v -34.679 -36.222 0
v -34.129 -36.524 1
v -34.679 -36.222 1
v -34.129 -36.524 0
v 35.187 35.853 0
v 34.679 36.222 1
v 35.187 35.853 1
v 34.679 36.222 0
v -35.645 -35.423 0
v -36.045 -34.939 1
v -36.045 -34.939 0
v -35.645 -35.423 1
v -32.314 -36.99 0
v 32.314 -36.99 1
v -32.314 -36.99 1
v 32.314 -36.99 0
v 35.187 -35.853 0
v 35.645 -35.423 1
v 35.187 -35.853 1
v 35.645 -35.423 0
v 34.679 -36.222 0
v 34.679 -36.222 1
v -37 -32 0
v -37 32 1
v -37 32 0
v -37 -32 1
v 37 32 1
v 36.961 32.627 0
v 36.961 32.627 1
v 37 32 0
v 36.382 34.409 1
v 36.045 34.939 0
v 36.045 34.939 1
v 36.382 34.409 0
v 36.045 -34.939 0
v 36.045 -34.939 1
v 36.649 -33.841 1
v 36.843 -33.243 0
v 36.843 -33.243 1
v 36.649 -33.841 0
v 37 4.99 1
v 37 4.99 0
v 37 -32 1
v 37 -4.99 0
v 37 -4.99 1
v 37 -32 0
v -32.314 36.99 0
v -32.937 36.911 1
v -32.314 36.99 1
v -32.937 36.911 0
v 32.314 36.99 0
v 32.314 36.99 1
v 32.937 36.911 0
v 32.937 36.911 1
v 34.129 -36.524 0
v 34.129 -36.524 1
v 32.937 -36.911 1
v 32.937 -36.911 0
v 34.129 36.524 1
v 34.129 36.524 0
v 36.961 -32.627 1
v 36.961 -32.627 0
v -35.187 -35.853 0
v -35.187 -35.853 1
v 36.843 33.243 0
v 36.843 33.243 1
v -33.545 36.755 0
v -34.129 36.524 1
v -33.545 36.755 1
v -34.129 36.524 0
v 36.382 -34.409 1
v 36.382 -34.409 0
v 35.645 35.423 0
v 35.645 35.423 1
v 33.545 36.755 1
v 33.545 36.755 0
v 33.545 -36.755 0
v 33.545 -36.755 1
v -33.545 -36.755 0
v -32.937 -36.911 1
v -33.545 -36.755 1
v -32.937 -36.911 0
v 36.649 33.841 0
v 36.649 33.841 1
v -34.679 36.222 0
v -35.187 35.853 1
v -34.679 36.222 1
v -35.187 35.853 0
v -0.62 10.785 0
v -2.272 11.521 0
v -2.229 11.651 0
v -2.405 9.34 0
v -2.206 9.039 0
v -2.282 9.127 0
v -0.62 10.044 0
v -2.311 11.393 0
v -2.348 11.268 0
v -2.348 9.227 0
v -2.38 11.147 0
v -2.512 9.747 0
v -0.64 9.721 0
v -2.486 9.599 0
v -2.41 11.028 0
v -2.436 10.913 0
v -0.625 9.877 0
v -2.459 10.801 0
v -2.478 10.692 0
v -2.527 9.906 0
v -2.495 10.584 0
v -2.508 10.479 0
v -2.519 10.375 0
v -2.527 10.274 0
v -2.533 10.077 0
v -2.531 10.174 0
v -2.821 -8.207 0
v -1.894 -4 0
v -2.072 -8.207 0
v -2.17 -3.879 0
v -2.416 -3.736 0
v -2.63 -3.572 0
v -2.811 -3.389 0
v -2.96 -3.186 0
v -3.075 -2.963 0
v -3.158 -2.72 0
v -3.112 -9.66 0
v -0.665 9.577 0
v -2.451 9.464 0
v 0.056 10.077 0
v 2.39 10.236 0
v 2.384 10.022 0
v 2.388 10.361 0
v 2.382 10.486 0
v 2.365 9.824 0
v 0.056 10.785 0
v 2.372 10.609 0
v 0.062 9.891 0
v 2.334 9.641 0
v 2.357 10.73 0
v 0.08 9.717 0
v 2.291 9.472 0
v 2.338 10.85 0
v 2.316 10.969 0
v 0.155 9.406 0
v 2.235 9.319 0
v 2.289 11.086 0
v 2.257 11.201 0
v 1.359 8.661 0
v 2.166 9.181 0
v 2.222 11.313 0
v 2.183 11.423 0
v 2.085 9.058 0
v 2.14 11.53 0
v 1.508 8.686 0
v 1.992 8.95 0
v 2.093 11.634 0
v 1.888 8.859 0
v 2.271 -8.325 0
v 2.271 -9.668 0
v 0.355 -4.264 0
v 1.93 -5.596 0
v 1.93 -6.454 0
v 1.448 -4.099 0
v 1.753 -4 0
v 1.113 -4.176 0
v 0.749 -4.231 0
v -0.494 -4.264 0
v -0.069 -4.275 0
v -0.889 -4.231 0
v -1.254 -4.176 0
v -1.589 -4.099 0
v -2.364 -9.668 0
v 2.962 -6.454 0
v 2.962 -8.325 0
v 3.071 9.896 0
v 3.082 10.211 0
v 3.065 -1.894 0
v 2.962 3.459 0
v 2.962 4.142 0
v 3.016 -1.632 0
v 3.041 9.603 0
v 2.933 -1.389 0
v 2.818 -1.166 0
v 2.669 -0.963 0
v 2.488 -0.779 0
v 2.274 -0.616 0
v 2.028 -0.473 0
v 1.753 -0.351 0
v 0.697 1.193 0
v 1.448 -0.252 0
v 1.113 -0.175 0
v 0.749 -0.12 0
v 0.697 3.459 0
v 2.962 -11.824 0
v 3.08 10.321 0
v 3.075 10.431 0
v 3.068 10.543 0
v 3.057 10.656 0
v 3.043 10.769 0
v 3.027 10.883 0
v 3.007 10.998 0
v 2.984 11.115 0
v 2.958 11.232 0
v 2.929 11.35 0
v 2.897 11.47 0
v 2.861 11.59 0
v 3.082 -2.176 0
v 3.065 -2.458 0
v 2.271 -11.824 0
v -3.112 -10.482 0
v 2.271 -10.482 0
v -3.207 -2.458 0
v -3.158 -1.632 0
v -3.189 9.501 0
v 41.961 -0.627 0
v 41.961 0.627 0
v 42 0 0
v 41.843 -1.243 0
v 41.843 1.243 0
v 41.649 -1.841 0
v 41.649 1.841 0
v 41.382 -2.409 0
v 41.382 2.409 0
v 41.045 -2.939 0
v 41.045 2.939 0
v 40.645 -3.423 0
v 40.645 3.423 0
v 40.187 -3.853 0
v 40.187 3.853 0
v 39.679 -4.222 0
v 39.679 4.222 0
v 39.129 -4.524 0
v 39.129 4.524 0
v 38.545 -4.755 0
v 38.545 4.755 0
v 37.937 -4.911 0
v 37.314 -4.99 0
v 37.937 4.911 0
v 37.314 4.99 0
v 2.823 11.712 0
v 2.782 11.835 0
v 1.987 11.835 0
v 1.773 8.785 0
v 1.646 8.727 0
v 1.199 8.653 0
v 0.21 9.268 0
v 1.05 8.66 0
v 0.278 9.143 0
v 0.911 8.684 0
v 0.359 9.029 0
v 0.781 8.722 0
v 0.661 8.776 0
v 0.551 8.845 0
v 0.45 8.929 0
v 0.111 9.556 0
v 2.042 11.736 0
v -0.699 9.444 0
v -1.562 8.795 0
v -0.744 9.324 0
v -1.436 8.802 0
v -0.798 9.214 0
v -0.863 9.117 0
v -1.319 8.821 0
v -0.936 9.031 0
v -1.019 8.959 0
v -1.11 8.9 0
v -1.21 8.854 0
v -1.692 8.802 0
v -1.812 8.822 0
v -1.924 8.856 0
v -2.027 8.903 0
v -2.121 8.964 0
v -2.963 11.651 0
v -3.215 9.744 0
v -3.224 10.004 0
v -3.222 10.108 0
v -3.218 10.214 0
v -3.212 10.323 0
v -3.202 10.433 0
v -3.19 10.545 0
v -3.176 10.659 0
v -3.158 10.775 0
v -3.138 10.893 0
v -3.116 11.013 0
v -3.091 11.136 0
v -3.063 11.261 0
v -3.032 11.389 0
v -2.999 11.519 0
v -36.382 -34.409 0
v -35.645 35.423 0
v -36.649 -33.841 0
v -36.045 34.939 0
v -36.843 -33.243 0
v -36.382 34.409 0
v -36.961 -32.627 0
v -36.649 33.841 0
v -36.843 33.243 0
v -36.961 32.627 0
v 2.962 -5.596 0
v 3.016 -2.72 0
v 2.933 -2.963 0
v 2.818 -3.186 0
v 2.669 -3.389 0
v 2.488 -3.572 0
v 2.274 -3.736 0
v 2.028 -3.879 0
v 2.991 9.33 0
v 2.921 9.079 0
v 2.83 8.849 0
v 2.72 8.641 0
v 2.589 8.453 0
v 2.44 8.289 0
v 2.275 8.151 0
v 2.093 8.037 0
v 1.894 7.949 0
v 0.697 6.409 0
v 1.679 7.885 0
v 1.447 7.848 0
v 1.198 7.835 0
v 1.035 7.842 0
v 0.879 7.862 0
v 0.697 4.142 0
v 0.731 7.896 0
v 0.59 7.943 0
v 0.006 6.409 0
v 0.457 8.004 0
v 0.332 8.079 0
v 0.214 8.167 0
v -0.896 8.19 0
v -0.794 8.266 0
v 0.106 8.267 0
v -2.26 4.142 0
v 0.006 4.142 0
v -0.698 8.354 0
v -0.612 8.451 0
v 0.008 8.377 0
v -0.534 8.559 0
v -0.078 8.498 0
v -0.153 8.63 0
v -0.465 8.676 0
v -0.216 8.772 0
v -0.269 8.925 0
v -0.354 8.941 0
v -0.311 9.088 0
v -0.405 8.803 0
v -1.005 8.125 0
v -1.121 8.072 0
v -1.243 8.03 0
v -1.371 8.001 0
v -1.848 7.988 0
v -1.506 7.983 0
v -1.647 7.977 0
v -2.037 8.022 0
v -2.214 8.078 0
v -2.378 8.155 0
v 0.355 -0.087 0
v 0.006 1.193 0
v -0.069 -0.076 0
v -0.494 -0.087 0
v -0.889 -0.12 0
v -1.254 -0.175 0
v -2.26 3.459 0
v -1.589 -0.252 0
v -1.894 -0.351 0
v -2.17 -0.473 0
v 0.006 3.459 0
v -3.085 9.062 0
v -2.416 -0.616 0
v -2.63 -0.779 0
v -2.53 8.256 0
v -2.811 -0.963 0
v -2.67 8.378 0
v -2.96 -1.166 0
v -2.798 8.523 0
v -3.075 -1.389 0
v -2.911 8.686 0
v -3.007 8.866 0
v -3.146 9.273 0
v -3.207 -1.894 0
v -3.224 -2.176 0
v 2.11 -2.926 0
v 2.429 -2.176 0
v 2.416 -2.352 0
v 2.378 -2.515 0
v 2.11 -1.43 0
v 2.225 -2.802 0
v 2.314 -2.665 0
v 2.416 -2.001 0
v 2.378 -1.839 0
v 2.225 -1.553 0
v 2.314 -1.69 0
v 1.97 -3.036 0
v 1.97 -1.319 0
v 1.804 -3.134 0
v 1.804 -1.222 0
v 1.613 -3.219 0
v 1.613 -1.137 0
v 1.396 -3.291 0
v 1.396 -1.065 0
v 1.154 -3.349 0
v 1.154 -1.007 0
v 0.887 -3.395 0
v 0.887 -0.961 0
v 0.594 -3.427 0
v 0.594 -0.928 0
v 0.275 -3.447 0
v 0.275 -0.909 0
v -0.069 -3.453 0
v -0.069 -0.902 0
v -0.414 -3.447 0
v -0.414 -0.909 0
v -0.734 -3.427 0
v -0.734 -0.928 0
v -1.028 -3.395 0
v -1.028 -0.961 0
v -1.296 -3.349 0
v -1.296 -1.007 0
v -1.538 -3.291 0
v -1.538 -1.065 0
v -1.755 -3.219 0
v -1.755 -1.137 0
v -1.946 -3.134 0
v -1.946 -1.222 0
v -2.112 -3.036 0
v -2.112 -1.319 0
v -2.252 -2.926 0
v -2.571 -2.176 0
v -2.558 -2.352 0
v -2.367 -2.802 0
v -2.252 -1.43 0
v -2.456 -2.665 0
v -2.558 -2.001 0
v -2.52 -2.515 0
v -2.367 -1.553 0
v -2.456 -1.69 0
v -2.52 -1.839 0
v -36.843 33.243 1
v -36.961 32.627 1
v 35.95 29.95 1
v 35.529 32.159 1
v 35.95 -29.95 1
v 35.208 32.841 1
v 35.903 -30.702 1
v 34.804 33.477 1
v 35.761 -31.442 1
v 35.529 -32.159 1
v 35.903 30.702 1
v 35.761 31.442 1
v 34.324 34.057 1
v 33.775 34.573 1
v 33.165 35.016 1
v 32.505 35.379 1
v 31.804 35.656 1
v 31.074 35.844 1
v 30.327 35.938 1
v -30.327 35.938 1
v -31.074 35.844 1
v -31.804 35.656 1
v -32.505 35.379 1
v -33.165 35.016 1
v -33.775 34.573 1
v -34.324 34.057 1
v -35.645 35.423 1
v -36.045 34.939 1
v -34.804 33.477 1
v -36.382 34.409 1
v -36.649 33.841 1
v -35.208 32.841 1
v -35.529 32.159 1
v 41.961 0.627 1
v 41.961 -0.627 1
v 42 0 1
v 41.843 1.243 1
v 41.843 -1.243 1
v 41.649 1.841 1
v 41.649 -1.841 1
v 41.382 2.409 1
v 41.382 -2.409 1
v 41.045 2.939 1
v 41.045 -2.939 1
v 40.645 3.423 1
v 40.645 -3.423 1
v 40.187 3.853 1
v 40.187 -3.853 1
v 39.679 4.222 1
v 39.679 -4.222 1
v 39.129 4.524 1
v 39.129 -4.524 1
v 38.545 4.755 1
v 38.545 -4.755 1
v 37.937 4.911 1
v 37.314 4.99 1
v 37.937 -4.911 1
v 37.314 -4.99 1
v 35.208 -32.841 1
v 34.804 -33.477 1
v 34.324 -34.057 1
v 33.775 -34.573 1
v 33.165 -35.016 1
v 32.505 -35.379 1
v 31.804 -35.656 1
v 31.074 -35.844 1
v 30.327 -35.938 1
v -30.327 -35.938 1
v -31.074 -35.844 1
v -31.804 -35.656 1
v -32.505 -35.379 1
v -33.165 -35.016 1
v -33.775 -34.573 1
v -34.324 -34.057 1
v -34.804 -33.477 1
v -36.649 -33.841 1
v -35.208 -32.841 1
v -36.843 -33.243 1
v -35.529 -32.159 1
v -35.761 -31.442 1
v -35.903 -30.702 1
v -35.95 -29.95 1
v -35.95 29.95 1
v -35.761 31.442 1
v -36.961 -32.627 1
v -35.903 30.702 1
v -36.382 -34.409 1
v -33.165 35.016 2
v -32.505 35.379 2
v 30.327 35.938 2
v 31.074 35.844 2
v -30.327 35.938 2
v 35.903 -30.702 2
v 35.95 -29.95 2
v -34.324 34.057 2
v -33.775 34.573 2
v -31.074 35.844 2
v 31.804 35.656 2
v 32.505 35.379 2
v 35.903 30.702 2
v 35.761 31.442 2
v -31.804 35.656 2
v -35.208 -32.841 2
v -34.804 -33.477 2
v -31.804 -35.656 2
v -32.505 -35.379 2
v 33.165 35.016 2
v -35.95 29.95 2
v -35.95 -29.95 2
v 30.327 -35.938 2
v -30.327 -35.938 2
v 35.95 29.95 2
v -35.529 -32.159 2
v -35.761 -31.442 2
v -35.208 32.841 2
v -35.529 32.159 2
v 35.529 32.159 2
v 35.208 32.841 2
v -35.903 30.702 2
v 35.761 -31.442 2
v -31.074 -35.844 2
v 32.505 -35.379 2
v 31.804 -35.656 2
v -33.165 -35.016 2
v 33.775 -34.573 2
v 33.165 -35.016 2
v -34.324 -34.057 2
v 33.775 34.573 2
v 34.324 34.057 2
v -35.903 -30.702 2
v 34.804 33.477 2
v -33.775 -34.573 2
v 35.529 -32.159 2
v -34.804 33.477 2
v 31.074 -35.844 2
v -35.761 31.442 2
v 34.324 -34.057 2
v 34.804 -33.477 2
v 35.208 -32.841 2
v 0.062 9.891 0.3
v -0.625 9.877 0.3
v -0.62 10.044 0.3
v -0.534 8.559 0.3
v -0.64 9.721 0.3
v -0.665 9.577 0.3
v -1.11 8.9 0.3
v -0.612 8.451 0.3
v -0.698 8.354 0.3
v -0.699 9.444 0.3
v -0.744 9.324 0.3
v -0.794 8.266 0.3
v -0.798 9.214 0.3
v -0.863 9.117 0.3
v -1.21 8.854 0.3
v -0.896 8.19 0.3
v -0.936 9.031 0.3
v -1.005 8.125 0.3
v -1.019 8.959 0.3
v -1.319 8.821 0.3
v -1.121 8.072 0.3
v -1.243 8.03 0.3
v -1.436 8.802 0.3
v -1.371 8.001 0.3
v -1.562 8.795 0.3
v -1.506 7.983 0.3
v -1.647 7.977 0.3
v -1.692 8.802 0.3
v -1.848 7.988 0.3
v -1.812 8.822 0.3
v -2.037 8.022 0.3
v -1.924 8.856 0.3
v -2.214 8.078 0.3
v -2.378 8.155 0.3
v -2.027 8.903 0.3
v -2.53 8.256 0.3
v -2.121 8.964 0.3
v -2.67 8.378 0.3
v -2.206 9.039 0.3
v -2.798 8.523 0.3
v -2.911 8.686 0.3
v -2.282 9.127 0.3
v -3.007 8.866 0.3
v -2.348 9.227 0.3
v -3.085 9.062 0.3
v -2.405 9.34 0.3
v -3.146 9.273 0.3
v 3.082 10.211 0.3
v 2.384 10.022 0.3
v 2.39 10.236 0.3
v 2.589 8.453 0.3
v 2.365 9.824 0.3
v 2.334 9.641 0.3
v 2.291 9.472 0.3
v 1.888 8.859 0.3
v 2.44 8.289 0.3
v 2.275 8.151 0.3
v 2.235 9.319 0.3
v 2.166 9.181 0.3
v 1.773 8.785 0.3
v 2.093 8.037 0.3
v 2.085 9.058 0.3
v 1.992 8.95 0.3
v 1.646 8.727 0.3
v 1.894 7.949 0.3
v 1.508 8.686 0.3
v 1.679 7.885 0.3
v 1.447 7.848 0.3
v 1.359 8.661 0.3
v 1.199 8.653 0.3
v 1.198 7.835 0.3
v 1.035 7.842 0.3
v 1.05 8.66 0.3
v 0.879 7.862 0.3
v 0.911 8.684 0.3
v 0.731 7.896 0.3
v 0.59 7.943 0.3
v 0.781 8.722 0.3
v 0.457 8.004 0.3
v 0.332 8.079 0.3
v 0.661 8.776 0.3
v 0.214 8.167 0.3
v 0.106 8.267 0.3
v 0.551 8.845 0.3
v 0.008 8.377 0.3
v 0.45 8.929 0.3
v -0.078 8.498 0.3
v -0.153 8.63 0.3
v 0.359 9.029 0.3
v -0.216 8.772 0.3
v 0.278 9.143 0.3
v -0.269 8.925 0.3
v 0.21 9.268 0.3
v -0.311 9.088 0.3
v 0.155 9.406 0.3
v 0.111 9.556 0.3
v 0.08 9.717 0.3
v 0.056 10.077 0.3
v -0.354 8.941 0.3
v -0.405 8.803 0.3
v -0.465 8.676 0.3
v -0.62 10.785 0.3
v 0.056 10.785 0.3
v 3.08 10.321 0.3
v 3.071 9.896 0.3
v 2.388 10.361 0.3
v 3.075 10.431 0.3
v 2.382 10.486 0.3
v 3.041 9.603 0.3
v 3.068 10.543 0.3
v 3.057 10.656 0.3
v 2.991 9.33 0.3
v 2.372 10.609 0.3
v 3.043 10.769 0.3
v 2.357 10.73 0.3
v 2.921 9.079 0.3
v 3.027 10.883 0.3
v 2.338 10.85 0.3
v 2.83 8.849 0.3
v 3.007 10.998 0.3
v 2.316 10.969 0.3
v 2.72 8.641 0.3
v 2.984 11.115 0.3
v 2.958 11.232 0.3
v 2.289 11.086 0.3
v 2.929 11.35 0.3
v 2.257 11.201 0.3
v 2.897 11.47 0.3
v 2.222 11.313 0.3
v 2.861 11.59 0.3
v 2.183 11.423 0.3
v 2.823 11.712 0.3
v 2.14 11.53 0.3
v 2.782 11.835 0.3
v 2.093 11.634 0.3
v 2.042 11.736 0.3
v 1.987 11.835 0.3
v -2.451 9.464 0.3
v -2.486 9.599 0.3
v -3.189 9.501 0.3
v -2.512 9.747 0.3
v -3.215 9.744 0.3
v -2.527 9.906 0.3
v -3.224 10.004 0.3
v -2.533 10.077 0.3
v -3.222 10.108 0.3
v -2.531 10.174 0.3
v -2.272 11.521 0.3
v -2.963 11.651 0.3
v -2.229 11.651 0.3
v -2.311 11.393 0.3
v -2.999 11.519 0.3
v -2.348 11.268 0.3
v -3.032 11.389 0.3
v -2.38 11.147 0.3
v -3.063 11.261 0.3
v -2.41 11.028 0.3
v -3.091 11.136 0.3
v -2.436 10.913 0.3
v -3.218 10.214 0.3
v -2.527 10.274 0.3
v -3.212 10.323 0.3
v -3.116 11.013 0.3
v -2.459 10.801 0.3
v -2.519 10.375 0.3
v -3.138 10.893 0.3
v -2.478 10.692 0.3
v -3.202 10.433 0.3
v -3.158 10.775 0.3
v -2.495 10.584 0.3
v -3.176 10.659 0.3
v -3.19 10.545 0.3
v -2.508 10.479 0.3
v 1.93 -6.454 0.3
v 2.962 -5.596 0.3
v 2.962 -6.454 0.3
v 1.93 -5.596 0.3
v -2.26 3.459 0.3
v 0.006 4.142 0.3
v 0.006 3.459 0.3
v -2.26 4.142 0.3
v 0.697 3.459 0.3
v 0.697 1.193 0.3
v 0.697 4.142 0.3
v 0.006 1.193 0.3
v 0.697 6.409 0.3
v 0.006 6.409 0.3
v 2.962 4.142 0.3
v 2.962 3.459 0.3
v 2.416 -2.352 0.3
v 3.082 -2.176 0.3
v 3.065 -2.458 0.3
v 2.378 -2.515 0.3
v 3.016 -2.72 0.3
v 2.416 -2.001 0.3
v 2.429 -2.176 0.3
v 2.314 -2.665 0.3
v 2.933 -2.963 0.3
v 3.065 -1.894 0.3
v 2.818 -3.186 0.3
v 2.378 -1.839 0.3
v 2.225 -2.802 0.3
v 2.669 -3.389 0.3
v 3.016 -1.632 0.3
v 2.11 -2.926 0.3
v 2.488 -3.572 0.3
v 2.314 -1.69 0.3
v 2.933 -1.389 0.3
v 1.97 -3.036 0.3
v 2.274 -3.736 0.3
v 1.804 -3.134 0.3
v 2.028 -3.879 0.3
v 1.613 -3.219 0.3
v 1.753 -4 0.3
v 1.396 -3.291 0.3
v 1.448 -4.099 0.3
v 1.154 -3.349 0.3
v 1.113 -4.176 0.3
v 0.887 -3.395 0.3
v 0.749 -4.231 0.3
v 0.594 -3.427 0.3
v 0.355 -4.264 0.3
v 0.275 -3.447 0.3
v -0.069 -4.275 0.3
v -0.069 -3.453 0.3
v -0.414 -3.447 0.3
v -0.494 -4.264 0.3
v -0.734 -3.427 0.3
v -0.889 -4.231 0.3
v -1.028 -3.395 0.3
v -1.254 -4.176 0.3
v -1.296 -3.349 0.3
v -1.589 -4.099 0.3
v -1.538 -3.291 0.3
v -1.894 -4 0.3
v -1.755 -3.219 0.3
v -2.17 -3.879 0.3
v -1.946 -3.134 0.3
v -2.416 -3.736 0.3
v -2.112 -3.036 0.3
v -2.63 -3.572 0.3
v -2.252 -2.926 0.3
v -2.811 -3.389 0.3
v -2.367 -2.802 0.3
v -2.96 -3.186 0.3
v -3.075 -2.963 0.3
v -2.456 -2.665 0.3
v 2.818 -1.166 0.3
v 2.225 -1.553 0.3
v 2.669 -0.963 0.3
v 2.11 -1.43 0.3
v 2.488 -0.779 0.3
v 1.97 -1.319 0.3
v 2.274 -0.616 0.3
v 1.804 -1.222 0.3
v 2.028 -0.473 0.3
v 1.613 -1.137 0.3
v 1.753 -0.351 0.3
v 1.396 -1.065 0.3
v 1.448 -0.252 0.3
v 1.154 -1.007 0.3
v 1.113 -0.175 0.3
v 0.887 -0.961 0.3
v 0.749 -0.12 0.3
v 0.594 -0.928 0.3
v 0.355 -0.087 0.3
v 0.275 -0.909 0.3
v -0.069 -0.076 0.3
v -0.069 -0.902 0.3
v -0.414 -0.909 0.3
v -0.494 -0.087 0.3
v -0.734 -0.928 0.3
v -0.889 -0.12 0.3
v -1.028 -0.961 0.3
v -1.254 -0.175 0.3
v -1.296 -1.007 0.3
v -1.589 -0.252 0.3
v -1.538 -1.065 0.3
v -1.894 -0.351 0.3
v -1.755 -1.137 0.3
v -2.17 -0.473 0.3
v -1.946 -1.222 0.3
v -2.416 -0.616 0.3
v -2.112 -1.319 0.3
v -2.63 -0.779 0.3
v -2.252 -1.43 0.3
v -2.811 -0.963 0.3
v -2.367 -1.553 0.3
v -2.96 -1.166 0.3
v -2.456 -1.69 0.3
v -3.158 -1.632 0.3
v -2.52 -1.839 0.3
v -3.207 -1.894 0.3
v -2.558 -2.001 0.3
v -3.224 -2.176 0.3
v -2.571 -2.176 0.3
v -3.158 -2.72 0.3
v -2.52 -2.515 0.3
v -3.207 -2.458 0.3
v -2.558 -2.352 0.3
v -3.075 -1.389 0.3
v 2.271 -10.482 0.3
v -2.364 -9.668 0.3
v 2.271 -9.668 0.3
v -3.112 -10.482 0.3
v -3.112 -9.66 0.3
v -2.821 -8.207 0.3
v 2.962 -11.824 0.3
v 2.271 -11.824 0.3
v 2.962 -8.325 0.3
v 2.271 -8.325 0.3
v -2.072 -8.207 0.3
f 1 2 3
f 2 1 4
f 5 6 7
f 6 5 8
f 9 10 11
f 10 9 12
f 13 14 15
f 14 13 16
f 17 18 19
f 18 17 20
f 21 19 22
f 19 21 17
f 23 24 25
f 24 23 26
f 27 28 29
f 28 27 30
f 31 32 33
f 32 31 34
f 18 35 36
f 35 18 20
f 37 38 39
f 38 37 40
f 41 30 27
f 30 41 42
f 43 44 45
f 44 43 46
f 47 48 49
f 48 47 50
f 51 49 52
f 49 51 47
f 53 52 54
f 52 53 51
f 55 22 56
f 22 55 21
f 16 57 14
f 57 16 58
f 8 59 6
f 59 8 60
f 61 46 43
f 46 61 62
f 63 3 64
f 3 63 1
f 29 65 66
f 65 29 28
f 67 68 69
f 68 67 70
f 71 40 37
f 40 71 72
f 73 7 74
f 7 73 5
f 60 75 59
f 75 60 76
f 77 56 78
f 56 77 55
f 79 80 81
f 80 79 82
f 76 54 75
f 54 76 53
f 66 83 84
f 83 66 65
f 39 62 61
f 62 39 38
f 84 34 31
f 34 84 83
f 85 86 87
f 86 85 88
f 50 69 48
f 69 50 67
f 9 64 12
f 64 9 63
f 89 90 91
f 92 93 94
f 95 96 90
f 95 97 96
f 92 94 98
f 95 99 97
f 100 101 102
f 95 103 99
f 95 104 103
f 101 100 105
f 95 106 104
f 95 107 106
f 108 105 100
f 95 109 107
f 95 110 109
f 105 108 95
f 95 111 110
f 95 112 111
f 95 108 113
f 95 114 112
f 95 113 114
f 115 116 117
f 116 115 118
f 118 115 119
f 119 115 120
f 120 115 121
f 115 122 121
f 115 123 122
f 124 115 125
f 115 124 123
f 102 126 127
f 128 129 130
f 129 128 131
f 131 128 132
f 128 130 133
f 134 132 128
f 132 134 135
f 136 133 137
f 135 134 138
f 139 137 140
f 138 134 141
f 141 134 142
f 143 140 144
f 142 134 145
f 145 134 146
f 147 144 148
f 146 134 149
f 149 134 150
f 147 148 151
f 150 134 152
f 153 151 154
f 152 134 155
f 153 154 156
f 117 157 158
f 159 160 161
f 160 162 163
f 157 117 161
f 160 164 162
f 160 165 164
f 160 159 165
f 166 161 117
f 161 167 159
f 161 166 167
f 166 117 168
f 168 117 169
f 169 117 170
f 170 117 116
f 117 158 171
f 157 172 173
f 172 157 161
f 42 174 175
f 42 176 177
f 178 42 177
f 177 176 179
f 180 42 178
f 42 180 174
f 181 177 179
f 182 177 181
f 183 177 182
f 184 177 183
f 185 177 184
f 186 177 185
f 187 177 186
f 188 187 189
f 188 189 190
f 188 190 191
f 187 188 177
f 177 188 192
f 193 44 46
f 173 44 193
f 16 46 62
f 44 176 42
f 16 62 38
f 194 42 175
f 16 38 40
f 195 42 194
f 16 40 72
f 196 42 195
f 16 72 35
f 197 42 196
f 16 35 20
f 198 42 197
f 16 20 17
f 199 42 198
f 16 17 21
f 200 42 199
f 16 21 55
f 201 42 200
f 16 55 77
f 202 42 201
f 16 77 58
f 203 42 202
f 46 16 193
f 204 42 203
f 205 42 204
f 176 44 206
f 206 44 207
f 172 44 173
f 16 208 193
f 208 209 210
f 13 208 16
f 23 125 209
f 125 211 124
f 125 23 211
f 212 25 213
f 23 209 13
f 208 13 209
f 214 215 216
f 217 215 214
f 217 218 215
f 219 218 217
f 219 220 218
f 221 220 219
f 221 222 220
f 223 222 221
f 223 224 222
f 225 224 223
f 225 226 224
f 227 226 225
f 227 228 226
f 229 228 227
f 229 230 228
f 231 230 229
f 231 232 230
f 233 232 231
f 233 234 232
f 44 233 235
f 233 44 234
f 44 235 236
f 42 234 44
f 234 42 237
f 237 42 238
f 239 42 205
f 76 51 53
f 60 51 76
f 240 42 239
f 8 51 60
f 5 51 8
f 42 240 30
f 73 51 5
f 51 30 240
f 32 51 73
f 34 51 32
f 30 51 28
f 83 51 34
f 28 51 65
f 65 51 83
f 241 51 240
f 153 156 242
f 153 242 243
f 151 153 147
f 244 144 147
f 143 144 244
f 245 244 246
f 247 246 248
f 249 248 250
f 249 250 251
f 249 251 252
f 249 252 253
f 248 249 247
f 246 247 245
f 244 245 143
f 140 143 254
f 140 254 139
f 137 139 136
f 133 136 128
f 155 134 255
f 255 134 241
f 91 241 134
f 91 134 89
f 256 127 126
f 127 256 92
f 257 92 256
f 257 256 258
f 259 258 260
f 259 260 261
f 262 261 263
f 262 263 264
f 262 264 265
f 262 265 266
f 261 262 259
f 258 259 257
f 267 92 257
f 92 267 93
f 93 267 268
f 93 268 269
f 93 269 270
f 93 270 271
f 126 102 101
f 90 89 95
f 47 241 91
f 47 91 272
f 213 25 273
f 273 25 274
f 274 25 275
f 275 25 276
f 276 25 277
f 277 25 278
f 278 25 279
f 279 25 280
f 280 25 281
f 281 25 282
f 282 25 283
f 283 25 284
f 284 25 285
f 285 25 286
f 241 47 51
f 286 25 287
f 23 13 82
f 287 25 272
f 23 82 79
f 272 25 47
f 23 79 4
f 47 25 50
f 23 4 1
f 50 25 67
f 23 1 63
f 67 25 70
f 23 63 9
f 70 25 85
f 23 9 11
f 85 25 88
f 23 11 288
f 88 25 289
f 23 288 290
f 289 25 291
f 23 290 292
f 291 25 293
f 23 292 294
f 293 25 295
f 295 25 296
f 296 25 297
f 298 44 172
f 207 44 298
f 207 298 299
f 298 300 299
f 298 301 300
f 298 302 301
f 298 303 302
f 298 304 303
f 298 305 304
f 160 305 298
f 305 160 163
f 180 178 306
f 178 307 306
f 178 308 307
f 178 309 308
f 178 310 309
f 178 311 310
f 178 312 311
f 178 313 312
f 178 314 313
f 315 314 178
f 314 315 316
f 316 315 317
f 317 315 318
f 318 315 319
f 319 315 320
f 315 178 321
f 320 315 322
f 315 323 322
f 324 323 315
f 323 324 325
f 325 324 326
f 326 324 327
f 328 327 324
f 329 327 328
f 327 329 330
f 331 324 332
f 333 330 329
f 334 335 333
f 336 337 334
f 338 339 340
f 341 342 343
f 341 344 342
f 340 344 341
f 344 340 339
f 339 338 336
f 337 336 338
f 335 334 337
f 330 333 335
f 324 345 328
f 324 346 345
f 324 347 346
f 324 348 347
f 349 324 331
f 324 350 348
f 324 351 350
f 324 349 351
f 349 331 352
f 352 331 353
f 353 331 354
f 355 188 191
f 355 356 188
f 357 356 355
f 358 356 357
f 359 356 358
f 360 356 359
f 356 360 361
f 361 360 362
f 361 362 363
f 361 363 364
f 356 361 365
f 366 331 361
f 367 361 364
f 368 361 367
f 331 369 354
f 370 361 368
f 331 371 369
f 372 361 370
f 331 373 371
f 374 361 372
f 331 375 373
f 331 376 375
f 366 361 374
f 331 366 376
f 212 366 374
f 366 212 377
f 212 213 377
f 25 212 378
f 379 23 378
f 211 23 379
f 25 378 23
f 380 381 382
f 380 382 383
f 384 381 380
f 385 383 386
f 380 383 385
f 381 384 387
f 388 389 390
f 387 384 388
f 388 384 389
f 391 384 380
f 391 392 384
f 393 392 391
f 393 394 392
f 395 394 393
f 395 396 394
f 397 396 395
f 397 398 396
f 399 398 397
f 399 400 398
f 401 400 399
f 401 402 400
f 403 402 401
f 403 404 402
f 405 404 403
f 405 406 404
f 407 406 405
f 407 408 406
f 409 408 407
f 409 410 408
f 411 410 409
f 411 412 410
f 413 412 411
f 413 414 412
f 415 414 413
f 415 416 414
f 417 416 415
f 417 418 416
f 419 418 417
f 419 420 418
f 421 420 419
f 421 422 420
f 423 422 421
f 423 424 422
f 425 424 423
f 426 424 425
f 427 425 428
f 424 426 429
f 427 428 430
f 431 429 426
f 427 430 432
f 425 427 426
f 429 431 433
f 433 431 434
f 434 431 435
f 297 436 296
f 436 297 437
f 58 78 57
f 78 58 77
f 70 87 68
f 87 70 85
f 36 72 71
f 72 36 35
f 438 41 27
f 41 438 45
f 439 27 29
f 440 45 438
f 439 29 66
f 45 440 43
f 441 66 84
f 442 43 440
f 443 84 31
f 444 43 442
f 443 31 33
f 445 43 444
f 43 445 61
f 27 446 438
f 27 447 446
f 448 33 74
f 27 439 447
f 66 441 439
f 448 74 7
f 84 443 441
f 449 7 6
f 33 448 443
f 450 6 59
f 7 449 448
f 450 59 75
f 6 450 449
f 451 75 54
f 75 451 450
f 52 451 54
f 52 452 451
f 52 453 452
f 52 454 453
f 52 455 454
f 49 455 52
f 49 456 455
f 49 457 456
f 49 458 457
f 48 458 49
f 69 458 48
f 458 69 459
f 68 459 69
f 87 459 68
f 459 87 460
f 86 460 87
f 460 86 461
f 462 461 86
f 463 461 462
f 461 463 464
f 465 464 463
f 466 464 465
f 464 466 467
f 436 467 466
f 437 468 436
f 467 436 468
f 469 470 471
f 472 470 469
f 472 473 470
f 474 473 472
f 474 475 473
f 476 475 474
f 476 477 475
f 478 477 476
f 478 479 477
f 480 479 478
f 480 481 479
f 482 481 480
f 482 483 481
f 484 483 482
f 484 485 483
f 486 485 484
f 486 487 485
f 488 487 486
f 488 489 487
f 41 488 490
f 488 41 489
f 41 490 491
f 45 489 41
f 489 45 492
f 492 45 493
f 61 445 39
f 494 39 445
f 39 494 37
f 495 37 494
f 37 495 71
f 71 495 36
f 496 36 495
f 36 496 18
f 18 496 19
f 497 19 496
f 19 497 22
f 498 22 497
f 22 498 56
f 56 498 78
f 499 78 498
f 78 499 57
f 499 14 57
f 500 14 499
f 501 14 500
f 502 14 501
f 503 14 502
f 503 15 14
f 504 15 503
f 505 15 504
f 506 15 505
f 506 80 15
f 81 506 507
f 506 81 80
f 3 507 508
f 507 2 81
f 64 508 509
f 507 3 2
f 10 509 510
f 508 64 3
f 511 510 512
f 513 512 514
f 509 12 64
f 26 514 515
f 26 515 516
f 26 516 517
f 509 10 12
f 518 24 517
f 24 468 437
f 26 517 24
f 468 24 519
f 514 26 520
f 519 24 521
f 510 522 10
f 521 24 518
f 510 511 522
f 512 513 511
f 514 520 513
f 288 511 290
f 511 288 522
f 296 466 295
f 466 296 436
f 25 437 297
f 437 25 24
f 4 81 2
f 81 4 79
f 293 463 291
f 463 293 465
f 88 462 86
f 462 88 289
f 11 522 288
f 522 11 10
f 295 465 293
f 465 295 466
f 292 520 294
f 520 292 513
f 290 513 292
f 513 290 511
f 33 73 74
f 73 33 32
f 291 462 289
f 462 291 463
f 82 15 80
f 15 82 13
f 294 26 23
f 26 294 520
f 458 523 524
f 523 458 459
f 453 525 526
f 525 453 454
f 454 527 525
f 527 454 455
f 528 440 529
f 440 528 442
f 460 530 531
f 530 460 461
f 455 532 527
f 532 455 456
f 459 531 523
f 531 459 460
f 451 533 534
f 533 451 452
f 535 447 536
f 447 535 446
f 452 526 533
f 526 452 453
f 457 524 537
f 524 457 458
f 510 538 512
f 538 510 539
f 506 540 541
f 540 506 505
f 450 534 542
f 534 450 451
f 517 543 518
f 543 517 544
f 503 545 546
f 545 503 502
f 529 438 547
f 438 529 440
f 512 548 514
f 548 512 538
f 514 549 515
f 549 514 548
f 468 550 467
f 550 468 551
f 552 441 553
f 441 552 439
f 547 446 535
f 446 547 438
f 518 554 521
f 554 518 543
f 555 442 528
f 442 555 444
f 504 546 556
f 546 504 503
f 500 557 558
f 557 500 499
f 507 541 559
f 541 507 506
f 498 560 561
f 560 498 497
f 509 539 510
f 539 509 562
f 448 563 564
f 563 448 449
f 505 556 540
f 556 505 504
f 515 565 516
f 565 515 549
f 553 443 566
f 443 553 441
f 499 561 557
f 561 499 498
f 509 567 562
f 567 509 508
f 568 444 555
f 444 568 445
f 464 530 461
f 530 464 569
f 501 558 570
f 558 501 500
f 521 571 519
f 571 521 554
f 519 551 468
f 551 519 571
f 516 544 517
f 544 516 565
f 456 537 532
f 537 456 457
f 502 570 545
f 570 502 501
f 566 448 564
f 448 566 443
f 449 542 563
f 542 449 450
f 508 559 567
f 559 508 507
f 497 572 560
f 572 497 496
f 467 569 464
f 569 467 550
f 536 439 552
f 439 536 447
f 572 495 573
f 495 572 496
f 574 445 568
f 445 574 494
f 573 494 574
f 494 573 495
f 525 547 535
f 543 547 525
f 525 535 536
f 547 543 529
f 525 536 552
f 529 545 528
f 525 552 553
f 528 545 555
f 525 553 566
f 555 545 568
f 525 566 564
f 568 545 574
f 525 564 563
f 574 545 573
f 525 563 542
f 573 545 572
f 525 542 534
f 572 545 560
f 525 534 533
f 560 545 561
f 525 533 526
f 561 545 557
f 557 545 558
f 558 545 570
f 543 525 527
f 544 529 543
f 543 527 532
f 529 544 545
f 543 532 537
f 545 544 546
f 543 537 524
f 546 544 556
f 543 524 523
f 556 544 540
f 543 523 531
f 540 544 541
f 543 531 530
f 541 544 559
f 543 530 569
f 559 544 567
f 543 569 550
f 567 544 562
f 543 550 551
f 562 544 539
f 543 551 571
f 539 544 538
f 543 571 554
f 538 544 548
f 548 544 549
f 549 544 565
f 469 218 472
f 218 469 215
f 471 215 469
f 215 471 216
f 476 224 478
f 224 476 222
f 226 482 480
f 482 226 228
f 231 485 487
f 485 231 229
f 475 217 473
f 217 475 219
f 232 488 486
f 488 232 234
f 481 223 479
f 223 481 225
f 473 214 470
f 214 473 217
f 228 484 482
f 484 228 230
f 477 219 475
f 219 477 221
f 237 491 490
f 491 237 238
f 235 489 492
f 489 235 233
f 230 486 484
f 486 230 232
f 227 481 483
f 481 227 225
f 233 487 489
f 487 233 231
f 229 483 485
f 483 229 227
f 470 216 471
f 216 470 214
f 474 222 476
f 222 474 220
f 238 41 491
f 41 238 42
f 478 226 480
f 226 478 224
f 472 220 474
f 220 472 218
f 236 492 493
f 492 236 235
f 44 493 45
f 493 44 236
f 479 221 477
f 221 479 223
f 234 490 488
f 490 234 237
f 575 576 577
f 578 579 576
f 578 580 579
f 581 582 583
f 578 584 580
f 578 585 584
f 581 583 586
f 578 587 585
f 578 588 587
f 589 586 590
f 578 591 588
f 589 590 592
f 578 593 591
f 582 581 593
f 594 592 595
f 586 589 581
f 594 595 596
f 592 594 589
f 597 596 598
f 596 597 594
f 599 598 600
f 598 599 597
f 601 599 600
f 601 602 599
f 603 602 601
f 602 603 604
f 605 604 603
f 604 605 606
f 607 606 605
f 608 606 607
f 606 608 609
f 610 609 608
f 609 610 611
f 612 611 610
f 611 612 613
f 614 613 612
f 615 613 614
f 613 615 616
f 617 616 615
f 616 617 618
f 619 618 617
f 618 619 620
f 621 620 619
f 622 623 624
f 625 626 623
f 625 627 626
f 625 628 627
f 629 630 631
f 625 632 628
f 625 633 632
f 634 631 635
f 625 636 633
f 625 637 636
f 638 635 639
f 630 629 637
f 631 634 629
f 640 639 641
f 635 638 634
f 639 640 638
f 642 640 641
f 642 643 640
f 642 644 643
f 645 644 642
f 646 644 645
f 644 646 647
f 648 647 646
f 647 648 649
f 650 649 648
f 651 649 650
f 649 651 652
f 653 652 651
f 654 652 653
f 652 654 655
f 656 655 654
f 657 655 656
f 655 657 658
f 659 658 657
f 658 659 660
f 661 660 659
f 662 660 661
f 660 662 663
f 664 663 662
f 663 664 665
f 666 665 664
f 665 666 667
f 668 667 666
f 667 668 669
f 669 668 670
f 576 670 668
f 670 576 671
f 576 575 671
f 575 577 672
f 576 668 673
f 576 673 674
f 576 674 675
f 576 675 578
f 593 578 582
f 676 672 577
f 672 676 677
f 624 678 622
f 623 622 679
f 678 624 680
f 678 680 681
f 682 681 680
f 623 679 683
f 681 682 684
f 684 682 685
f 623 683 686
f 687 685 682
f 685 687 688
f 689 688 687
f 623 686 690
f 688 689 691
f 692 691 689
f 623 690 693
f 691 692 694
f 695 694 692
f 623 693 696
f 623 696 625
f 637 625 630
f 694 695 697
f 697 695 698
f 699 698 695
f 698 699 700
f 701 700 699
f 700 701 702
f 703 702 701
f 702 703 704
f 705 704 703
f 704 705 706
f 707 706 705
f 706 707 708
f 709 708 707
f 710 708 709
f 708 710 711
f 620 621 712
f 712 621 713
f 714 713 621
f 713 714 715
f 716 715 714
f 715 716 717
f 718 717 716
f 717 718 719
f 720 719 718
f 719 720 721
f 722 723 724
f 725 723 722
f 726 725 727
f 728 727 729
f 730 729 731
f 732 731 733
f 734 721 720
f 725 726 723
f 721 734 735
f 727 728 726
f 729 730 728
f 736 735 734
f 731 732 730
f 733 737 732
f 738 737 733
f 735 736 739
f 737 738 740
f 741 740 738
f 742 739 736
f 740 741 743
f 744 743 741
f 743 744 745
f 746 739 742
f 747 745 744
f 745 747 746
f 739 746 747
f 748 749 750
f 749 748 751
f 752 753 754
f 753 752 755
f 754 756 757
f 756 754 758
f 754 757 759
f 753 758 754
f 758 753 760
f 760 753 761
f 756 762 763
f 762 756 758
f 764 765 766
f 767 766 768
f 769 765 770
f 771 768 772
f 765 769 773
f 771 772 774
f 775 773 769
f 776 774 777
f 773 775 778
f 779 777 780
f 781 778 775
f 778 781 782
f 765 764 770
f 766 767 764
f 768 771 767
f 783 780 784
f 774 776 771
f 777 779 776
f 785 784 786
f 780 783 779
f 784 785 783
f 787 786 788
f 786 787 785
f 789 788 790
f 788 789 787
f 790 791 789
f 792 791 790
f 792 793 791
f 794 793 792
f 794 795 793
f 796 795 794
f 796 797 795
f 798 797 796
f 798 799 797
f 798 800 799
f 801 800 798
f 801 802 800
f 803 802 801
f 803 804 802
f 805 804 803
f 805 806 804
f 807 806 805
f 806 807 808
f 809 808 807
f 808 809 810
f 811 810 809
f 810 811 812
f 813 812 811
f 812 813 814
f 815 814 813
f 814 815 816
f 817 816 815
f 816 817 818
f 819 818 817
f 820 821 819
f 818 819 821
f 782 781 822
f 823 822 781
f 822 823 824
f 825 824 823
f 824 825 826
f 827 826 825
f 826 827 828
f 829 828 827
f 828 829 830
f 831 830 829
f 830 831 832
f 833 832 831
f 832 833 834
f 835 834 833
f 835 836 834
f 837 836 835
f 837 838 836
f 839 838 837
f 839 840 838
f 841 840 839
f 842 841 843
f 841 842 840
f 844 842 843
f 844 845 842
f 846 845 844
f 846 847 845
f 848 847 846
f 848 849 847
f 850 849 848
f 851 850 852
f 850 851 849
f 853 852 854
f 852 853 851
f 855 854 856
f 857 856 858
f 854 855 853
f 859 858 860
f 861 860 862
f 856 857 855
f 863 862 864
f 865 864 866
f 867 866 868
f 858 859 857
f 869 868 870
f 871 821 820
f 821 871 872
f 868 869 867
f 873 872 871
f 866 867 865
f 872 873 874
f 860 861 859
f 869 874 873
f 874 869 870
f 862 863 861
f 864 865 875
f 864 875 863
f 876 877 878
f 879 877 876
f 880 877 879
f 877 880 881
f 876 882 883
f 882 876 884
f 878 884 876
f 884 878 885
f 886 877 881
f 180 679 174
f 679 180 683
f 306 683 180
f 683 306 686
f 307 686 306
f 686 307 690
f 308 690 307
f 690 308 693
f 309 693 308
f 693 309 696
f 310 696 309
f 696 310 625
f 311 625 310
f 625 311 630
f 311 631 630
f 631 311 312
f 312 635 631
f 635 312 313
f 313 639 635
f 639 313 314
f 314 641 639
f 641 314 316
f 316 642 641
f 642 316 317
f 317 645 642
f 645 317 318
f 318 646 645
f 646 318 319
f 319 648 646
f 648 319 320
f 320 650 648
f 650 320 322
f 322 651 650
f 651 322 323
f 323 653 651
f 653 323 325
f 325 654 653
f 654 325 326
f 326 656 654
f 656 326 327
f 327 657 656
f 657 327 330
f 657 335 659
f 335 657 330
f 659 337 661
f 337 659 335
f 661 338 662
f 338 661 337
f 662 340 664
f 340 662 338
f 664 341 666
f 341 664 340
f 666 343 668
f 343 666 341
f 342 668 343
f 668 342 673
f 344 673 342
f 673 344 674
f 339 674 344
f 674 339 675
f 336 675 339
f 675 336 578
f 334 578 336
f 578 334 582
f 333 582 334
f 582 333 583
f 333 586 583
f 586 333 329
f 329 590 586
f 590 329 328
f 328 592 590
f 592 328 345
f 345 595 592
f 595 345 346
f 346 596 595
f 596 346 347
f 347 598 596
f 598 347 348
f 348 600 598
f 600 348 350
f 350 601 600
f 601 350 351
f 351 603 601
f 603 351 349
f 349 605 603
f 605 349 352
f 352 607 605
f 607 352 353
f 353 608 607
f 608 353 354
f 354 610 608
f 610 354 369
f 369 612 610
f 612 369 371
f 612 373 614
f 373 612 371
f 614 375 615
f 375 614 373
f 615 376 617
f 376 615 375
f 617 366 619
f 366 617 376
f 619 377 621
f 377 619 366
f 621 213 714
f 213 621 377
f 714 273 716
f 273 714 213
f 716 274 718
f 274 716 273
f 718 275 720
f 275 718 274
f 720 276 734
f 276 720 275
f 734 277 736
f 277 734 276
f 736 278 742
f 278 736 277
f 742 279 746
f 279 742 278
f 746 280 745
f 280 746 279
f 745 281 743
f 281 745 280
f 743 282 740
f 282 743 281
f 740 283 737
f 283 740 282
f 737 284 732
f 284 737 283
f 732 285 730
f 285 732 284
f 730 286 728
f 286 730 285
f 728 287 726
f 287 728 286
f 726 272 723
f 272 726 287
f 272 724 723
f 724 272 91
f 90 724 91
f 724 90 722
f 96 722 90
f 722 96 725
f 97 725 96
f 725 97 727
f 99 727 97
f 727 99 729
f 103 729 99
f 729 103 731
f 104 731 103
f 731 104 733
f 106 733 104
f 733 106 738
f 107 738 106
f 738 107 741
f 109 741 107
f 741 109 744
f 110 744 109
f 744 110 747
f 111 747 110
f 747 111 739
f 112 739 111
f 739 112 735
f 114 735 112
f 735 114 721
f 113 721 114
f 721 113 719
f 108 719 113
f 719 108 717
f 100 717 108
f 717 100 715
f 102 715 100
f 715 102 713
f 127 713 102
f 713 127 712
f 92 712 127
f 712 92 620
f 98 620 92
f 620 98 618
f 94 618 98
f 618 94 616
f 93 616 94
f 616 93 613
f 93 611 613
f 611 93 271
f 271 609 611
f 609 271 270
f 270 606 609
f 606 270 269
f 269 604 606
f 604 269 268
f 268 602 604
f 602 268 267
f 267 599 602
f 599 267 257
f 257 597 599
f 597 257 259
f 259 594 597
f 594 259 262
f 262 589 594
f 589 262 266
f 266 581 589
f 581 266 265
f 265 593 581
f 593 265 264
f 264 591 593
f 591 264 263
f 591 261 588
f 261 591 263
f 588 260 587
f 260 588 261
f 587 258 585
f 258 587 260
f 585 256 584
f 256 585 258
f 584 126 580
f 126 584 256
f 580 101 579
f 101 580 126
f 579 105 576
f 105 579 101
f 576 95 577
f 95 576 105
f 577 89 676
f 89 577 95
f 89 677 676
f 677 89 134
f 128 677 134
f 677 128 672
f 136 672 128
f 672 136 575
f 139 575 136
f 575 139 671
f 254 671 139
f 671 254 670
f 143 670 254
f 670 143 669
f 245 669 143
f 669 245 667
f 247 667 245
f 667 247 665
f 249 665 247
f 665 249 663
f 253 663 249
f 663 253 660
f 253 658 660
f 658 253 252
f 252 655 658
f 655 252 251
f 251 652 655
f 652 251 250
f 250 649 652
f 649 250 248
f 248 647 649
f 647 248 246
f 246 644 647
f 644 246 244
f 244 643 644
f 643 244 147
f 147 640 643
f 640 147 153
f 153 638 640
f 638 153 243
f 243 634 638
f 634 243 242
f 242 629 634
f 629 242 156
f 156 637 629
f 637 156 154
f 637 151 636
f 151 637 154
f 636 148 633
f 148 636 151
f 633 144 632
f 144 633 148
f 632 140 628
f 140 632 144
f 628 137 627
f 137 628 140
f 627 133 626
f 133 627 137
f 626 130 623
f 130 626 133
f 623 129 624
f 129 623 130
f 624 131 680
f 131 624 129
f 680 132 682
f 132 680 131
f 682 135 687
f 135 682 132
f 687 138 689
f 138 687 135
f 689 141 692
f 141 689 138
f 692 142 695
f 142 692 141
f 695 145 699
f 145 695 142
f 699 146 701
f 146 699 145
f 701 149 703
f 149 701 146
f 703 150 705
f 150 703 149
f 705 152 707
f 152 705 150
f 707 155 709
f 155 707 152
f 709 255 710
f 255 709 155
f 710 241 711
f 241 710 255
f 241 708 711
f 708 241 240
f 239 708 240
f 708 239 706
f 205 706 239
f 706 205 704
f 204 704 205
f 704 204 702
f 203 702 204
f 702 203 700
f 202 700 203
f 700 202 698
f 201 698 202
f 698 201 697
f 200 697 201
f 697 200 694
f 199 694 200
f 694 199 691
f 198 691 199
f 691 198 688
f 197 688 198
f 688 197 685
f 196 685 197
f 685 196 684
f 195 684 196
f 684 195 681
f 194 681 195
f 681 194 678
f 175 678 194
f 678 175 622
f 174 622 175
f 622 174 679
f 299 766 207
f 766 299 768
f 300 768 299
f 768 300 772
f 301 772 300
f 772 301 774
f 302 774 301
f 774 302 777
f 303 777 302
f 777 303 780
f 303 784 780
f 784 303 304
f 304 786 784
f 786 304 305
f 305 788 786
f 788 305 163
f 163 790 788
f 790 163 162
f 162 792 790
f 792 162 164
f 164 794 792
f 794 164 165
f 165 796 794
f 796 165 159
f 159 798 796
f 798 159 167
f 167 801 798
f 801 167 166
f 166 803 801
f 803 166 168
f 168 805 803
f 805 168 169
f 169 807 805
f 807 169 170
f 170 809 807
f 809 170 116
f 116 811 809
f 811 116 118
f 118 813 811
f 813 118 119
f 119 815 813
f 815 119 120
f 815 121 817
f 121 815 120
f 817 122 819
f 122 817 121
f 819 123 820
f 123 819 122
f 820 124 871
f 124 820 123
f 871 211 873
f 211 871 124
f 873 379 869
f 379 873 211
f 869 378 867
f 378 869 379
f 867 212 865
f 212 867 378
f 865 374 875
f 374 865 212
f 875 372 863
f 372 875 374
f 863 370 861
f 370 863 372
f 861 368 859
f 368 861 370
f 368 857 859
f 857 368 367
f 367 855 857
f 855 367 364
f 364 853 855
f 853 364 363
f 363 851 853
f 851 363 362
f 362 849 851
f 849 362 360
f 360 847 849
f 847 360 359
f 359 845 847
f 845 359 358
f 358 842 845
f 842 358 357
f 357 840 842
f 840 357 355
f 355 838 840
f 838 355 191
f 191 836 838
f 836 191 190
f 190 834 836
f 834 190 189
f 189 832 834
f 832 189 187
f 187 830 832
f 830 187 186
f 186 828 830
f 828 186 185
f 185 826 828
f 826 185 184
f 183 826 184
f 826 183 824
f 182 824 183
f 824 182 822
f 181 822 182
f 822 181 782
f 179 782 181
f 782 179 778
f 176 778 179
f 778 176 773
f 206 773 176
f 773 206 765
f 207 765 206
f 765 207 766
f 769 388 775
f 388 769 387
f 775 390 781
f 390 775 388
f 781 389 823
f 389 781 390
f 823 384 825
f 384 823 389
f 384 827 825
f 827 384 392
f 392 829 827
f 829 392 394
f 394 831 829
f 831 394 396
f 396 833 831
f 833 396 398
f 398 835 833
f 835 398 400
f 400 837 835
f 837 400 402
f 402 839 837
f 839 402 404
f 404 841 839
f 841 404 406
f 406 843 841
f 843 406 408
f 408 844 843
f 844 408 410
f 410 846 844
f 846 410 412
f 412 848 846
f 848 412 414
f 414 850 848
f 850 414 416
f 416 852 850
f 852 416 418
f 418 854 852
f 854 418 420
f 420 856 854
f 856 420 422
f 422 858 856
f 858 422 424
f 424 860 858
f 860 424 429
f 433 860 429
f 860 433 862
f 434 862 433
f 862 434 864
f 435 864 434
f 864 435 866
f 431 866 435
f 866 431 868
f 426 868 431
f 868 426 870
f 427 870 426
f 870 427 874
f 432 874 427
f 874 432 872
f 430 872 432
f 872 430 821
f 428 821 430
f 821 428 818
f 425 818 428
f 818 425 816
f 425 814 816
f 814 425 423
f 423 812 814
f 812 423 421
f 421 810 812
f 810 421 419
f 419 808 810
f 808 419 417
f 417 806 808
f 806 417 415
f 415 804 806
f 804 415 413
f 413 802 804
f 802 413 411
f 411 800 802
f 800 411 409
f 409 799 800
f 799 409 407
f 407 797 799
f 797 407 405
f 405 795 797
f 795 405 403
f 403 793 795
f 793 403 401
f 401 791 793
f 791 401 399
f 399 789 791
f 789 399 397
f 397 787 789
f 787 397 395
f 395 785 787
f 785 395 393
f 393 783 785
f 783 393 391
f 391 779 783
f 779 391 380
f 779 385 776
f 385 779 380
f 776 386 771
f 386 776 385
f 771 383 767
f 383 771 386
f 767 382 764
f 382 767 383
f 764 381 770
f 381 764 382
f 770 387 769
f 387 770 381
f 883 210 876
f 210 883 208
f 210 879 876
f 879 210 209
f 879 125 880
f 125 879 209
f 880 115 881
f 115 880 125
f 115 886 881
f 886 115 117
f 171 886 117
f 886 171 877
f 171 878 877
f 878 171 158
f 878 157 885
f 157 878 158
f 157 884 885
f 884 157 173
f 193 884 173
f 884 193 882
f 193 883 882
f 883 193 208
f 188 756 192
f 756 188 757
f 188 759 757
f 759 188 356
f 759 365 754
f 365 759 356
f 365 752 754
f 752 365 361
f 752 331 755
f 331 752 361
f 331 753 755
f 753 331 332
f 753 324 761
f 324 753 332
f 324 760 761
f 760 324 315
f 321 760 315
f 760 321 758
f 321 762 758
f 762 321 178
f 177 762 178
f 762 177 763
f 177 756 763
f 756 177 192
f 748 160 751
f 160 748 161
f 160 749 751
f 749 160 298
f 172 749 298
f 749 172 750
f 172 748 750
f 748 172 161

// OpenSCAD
$fn = 50;


difference() {
	union() {
		translate(v = [0, 0, 0]) {
			rotate(a = [0, 0, 0]) {
				hull() {
					translate(v = [-32.0000000000, 32.0000000000, 0]) {
						rotate(a = [0, 0, 0]) {
							translate(v = [0, 0, 0]) {
								rotate(a = [0, 0, 0]) {
									cylinder(h = 1, r = 5);
								}
							}
						}
					}
					translate(v = [32.0000000000, 32.0000000000, 0]) {
						rotate(a = [0, 0, 0]) {
							translate(v = [0, 0, 0]) {
								rotate(a = [0, 0, 0]) {
									cylinder(h = 1, r = 5);
								}
							}
						}
					}
					translate(v = [-32.0000000000, -32.0000000000, 0]) {
						rotate(a = [0, 0, 0]) {
							translate(v = [0, 0, 0]) {
								rotate(a = [0, 0, 0]) {
									cylinder(h = 1, r = 5);
								}
							}
						}
					}
					translate(v = [32.0000000000, -32.0000000000, 0]) {
						rotate(a = [0, 0, 0]) {
							translate(v = [0, 0, 0]) {
								rotate(a = [0, 0, 0]) {
									cylinder(h = 1, r = 5);
								}
							}
						}
					}
				}
			}
		}
		translate(v = [0, 0, 0]) {
			rotate(a = [0, 0, 0]) {
				hull() {
					translate(v = [-29.9500000000, 29.9500000000, 0]) {
						rotate(a = [0, 0, 0]) {
							translate(v = [0, 0, 0]) {
								rotate(a = [0, 0, 0]) {
									cylinder(h = 2, r = 6);
								}
							}
						}
					}
					translate(v = [29.9500000000, 29.9500000000, 0]) {
						rotate(a = [0, 0, 0]) {
							translate(v = [0, 0, 0]) {
								rotate(a = [0, 0, 0]) {
									cylinder(h = 2, r = 6);
								}
							}
						}
					}
					translate(v = [-29.9500000000, -29.9500000000, 0]) {
						rotate(a = [0, 0, 0]) {
							translate(v = [0, 0, 0]) {
								rotate(a = [0, 0, 0]) {
									cylinder(h = 2, r = 6);
								}
							}
						}
					}
					translate(v = [29.9500000000, -29.9500000000, 0]) {
						rotate(a = [0, 0, 0]) {
							translate(v = [0, 0, 0]) {
								rotate(a = [0, 0, 0]) {
									cylinder(h = 2, r = 6);
								}
							}
						}
					}
				}
			}
		}
		translate(v = [37.0000000000, 0, 0.0000000000]) {
			rotate(a = [0, 0, 0]) {
				cylinder(h = 1, r = 5);
			}
		}
	}
	union() {
		translate(v = [0, 0, 0.3000000000]) {
			rotate(a = [0, 180, 90]) {
				linear_extrude(height = 0.3000000000) {
					text(font = "Candara:Light", halign = "center", size = 6, text = "3+0.1", valign = "center");
				}
			}
		}
	}
}
